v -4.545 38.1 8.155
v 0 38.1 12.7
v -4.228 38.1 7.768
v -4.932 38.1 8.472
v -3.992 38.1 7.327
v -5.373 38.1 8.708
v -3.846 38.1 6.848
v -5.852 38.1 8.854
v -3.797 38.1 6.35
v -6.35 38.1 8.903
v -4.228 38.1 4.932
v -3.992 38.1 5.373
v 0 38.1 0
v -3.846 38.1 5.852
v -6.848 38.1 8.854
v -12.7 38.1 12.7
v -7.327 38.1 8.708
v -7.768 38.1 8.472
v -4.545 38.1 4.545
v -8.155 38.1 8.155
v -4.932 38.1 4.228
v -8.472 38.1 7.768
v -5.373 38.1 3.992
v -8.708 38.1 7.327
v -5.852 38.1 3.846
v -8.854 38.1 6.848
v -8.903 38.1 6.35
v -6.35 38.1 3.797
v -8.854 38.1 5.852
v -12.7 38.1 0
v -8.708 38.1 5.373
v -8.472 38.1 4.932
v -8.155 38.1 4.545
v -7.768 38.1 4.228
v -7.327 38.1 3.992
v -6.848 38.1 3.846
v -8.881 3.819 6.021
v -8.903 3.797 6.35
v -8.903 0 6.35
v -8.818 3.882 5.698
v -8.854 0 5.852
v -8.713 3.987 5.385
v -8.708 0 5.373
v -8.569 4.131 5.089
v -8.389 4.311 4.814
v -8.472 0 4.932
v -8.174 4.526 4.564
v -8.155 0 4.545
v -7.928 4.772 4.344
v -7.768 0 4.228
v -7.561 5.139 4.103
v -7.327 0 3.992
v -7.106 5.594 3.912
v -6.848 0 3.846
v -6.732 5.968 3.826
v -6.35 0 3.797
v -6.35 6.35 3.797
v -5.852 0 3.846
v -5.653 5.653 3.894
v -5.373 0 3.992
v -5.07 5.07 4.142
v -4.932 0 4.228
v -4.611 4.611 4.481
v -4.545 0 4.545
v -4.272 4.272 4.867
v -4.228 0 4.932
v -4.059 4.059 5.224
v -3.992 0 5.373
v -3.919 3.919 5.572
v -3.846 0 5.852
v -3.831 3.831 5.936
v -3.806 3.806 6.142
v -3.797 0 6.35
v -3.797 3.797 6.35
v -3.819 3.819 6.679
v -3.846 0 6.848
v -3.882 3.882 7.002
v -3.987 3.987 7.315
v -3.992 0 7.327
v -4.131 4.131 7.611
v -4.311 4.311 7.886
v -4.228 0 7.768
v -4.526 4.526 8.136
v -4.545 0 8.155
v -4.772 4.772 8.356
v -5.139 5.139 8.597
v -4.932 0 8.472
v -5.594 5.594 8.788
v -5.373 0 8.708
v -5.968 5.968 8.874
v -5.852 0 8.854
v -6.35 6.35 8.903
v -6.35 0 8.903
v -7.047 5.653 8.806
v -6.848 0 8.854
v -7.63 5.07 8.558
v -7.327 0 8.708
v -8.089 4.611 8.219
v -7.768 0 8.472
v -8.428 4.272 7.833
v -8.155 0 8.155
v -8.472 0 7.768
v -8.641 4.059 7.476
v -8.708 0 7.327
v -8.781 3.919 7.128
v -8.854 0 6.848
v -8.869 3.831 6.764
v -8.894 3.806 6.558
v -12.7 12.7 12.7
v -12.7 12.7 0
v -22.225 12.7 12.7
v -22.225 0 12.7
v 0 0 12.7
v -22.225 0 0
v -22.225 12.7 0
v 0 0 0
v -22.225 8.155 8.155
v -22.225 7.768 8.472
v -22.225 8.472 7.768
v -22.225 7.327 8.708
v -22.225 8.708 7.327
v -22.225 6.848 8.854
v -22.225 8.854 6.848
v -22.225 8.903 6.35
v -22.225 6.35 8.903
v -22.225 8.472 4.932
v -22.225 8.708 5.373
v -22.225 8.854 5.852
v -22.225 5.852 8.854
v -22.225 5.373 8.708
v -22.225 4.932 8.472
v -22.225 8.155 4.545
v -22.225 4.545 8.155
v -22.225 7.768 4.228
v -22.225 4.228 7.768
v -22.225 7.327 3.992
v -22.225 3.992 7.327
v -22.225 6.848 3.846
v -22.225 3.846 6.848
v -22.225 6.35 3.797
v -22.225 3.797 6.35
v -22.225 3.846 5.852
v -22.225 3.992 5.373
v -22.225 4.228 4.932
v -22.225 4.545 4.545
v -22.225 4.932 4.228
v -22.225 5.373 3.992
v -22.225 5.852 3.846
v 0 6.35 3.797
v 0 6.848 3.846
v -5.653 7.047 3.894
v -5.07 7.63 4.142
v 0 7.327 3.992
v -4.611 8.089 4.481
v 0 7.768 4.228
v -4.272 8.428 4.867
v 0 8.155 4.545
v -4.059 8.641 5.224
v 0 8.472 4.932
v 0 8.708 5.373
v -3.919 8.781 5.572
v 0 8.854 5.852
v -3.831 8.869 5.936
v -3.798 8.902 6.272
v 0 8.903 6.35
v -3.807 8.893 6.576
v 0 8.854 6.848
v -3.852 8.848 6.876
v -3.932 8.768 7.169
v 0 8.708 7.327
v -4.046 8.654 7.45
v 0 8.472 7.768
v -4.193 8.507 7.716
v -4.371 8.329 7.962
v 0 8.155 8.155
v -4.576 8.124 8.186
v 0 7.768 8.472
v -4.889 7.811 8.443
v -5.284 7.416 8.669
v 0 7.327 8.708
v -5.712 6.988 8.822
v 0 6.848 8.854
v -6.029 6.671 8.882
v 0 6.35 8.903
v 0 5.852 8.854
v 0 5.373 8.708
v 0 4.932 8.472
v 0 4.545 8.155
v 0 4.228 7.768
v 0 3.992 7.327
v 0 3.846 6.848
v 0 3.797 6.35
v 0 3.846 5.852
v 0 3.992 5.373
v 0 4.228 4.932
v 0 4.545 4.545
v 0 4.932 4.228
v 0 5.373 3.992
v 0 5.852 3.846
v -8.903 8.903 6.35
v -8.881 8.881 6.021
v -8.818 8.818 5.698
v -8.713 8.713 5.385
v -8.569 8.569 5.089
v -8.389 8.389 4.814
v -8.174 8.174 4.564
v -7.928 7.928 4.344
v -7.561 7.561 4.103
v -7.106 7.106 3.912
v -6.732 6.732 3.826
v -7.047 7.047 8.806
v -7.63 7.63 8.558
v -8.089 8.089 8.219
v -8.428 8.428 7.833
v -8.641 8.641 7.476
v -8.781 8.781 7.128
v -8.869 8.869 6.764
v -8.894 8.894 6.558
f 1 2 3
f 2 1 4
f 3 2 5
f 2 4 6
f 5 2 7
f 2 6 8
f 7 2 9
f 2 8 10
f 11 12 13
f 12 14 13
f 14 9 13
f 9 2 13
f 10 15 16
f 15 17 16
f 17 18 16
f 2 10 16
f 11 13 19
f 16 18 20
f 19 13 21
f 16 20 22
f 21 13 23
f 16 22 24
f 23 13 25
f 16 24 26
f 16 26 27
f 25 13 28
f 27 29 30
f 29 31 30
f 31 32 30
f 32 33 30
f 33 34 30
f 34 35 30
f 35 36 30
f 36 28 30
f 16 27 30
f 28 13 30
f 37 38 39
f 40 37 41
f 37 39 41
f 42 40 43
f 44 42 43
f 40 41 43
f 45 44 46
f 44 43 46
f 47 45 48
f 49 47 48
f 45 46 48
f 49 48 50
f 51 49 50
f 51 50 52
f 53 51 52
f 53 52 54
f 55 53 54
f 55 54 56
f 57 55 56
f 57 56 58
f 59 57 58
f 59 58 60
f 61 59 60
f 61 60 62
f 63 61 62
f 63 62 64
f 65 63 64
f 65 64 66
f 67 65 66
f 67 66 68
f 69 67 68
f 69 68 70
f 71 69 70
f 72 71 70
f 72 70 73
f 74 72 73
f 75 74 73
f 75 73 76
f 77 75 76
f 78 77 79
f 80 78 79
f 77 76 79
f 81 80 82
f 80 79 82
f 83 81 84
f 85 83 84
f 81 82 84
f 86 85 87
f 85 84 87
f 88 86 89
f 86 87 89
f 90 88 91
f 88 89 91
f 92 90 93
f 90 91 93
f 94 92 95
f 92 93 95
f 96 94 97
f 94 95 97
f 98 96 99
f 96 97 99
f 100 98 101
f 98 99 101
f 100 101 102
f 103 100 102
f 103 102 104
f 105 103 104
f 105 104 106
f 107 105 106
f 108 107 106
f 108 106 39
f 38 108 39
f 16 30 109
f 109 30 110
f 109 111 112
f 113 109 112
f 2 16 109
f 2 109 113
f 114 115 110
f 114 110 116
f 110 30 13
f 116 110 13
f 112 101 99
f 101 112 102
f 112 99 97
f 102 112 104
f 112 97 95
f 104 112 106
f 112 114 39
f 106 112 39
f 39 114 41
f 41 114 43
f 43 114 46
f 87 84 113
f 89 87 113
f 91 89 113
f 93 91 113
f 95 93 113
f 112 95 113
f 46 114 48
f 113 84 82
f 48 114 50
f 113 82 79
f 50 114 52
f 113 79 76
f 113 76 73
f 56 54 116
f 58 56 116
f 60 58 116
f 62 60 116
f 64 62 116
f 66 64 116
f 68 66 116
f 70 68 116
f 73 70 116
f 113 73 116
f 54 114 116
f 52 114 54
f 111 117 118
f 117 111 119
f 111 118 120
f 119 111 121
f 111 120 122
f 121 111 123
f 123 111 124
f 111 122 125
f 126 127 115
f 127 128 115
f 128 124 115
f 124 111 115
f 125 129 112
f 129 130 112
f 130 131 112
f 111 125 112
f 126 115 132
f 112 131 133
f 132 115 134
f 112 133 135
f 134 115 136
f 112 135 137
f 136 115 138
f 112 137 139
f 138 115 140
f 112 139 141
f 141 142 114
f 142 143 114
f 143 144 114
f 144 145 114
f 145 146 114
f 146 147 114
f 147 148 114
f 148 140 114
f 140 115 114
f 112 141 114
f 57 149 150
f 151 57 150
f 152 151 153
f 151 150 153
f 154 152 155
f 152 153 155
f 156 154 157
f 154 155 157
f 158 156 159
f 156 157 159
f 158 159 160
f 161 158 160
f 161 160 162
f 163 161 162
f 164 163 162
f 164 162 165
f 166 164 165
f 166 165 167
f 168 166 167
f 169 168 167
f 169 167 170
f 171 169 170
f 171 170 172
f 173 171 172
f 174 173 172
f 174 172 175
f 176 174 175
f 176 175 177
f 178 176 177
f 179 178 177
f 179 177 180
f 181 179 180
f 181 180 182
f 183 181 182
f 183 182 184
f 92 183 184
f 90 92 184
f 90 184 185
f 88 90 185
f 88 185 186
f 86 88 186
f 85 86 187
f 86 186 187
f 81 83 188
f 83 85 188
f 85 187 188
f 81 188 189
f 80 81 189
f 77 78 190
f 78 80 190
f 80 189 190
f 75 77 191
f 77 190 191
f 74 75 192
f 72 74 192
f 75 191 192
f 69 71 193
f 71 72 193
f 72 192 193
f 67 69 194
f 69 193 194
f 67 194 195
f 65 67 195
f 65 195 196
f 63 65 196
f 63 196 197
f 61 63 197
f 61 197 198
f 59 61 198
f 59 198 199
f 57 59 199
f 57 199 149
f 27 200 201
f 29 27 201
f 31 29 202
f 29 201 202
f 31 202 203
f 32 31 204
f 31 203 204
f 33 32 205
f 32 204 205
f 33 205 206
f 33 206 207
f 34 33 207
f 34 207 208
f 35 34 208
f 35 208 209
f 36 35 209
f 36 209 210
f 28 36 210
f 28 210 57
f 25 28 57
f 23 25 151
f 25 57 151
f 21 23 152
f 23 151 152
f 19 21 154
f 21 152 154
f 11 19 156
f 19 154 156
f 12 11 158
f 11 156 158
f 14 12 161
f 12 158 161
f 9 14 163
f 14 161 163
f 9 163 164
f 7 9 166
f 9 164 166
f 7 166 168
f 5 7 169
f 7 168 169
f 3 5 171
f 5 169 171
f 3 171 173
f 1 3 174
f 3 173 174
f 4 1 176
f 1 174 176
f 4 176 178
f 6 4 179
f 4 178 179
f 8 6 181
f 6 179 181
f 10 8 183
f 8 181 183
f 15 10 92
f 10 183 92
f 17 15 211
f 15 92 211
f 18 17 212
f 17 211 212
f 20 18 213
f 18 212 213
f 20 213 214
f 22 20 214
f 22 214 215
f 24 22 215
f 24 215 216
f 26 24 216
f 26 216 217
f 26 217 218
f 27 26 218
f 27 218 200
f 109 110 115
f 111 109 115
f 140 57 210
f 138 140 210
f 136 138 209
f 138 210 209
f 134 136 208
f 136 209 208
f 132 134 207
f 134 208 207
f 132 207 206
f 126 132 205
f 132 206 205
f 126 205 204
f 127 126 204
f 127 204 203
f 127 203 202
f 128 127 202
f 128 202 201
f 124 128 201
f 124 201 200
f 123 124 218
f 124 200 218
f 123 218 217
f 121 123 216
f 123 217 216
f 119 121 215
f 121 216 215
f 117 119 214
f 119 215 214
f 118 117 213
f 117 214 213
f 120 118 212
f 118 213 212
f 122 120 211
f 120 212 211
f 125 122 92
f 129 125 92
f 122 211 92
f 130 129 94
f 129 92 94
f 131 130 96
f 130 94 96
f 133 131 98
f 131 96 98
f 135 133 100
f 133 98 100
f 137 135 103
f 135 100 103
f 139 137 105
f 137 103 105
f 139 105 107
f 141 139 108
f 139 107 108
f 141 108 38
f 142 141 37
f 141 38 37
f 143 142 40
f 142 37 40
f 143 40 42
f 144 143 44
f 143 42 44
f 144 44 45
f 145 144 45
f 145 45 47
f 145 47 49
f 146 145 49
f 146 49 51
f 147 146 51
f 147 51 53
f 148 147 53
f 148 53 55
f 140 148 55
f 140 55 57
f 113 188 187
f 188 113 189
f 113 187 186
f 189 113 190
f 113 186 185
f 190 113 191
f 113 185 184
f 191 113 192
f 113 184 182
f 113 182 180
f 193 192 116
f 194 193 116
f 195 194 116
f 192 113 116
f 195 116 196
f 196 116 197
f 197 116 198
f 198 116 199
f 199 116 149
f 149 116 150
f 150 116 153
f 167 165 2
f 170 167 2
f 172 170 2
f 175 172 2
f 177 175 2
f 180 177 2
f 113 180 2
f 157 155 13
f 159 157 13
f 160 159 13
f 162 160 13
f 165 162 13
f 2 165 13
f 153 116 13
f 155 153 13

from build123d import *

# Parameters (mm, degrees)
BOSS_EXTRUDE1_DEPTH     = 12.7
F_1_4_20_TAPPED_HOLE1_D = 5.1054
F_1_4_20_TAPPED_HOLE2_D = 5.1054


with BuildPart() as part:
    # Sketch1 → Boss-Extrude1 (new body)
    with BuildSketch(Plane.XY):
        Polygon((0, 0), (0, 38.1), (-12.7, 38.1), (-12.7, 12.7), (-22.225, 12.7), (-22.225, 0), align=None)
    extrude(amount=BOSS_EXTRUDE1_DEPTH)

    # 1/4-20 Tapped Hole1 (through all)
    with Locations(Plane(origin=(0, 38.1, 0), x_dir=(1, 0, 0), z_dir=(0, 1, 0))):
        with Locations((-6.35, -6.35)):
            Hole(F_1_4_20_TAPPED_HOLE1_D / 2)

    # 1/4-20 Tapped Hole2 (through all)
    with Locations(Plane.ZY.offset(22.225)):
        with Locations((6.35, 6.35)):
            Hole(F_1_4_20_TAPPED_HOLE2_D / 2)


solid = part.part
